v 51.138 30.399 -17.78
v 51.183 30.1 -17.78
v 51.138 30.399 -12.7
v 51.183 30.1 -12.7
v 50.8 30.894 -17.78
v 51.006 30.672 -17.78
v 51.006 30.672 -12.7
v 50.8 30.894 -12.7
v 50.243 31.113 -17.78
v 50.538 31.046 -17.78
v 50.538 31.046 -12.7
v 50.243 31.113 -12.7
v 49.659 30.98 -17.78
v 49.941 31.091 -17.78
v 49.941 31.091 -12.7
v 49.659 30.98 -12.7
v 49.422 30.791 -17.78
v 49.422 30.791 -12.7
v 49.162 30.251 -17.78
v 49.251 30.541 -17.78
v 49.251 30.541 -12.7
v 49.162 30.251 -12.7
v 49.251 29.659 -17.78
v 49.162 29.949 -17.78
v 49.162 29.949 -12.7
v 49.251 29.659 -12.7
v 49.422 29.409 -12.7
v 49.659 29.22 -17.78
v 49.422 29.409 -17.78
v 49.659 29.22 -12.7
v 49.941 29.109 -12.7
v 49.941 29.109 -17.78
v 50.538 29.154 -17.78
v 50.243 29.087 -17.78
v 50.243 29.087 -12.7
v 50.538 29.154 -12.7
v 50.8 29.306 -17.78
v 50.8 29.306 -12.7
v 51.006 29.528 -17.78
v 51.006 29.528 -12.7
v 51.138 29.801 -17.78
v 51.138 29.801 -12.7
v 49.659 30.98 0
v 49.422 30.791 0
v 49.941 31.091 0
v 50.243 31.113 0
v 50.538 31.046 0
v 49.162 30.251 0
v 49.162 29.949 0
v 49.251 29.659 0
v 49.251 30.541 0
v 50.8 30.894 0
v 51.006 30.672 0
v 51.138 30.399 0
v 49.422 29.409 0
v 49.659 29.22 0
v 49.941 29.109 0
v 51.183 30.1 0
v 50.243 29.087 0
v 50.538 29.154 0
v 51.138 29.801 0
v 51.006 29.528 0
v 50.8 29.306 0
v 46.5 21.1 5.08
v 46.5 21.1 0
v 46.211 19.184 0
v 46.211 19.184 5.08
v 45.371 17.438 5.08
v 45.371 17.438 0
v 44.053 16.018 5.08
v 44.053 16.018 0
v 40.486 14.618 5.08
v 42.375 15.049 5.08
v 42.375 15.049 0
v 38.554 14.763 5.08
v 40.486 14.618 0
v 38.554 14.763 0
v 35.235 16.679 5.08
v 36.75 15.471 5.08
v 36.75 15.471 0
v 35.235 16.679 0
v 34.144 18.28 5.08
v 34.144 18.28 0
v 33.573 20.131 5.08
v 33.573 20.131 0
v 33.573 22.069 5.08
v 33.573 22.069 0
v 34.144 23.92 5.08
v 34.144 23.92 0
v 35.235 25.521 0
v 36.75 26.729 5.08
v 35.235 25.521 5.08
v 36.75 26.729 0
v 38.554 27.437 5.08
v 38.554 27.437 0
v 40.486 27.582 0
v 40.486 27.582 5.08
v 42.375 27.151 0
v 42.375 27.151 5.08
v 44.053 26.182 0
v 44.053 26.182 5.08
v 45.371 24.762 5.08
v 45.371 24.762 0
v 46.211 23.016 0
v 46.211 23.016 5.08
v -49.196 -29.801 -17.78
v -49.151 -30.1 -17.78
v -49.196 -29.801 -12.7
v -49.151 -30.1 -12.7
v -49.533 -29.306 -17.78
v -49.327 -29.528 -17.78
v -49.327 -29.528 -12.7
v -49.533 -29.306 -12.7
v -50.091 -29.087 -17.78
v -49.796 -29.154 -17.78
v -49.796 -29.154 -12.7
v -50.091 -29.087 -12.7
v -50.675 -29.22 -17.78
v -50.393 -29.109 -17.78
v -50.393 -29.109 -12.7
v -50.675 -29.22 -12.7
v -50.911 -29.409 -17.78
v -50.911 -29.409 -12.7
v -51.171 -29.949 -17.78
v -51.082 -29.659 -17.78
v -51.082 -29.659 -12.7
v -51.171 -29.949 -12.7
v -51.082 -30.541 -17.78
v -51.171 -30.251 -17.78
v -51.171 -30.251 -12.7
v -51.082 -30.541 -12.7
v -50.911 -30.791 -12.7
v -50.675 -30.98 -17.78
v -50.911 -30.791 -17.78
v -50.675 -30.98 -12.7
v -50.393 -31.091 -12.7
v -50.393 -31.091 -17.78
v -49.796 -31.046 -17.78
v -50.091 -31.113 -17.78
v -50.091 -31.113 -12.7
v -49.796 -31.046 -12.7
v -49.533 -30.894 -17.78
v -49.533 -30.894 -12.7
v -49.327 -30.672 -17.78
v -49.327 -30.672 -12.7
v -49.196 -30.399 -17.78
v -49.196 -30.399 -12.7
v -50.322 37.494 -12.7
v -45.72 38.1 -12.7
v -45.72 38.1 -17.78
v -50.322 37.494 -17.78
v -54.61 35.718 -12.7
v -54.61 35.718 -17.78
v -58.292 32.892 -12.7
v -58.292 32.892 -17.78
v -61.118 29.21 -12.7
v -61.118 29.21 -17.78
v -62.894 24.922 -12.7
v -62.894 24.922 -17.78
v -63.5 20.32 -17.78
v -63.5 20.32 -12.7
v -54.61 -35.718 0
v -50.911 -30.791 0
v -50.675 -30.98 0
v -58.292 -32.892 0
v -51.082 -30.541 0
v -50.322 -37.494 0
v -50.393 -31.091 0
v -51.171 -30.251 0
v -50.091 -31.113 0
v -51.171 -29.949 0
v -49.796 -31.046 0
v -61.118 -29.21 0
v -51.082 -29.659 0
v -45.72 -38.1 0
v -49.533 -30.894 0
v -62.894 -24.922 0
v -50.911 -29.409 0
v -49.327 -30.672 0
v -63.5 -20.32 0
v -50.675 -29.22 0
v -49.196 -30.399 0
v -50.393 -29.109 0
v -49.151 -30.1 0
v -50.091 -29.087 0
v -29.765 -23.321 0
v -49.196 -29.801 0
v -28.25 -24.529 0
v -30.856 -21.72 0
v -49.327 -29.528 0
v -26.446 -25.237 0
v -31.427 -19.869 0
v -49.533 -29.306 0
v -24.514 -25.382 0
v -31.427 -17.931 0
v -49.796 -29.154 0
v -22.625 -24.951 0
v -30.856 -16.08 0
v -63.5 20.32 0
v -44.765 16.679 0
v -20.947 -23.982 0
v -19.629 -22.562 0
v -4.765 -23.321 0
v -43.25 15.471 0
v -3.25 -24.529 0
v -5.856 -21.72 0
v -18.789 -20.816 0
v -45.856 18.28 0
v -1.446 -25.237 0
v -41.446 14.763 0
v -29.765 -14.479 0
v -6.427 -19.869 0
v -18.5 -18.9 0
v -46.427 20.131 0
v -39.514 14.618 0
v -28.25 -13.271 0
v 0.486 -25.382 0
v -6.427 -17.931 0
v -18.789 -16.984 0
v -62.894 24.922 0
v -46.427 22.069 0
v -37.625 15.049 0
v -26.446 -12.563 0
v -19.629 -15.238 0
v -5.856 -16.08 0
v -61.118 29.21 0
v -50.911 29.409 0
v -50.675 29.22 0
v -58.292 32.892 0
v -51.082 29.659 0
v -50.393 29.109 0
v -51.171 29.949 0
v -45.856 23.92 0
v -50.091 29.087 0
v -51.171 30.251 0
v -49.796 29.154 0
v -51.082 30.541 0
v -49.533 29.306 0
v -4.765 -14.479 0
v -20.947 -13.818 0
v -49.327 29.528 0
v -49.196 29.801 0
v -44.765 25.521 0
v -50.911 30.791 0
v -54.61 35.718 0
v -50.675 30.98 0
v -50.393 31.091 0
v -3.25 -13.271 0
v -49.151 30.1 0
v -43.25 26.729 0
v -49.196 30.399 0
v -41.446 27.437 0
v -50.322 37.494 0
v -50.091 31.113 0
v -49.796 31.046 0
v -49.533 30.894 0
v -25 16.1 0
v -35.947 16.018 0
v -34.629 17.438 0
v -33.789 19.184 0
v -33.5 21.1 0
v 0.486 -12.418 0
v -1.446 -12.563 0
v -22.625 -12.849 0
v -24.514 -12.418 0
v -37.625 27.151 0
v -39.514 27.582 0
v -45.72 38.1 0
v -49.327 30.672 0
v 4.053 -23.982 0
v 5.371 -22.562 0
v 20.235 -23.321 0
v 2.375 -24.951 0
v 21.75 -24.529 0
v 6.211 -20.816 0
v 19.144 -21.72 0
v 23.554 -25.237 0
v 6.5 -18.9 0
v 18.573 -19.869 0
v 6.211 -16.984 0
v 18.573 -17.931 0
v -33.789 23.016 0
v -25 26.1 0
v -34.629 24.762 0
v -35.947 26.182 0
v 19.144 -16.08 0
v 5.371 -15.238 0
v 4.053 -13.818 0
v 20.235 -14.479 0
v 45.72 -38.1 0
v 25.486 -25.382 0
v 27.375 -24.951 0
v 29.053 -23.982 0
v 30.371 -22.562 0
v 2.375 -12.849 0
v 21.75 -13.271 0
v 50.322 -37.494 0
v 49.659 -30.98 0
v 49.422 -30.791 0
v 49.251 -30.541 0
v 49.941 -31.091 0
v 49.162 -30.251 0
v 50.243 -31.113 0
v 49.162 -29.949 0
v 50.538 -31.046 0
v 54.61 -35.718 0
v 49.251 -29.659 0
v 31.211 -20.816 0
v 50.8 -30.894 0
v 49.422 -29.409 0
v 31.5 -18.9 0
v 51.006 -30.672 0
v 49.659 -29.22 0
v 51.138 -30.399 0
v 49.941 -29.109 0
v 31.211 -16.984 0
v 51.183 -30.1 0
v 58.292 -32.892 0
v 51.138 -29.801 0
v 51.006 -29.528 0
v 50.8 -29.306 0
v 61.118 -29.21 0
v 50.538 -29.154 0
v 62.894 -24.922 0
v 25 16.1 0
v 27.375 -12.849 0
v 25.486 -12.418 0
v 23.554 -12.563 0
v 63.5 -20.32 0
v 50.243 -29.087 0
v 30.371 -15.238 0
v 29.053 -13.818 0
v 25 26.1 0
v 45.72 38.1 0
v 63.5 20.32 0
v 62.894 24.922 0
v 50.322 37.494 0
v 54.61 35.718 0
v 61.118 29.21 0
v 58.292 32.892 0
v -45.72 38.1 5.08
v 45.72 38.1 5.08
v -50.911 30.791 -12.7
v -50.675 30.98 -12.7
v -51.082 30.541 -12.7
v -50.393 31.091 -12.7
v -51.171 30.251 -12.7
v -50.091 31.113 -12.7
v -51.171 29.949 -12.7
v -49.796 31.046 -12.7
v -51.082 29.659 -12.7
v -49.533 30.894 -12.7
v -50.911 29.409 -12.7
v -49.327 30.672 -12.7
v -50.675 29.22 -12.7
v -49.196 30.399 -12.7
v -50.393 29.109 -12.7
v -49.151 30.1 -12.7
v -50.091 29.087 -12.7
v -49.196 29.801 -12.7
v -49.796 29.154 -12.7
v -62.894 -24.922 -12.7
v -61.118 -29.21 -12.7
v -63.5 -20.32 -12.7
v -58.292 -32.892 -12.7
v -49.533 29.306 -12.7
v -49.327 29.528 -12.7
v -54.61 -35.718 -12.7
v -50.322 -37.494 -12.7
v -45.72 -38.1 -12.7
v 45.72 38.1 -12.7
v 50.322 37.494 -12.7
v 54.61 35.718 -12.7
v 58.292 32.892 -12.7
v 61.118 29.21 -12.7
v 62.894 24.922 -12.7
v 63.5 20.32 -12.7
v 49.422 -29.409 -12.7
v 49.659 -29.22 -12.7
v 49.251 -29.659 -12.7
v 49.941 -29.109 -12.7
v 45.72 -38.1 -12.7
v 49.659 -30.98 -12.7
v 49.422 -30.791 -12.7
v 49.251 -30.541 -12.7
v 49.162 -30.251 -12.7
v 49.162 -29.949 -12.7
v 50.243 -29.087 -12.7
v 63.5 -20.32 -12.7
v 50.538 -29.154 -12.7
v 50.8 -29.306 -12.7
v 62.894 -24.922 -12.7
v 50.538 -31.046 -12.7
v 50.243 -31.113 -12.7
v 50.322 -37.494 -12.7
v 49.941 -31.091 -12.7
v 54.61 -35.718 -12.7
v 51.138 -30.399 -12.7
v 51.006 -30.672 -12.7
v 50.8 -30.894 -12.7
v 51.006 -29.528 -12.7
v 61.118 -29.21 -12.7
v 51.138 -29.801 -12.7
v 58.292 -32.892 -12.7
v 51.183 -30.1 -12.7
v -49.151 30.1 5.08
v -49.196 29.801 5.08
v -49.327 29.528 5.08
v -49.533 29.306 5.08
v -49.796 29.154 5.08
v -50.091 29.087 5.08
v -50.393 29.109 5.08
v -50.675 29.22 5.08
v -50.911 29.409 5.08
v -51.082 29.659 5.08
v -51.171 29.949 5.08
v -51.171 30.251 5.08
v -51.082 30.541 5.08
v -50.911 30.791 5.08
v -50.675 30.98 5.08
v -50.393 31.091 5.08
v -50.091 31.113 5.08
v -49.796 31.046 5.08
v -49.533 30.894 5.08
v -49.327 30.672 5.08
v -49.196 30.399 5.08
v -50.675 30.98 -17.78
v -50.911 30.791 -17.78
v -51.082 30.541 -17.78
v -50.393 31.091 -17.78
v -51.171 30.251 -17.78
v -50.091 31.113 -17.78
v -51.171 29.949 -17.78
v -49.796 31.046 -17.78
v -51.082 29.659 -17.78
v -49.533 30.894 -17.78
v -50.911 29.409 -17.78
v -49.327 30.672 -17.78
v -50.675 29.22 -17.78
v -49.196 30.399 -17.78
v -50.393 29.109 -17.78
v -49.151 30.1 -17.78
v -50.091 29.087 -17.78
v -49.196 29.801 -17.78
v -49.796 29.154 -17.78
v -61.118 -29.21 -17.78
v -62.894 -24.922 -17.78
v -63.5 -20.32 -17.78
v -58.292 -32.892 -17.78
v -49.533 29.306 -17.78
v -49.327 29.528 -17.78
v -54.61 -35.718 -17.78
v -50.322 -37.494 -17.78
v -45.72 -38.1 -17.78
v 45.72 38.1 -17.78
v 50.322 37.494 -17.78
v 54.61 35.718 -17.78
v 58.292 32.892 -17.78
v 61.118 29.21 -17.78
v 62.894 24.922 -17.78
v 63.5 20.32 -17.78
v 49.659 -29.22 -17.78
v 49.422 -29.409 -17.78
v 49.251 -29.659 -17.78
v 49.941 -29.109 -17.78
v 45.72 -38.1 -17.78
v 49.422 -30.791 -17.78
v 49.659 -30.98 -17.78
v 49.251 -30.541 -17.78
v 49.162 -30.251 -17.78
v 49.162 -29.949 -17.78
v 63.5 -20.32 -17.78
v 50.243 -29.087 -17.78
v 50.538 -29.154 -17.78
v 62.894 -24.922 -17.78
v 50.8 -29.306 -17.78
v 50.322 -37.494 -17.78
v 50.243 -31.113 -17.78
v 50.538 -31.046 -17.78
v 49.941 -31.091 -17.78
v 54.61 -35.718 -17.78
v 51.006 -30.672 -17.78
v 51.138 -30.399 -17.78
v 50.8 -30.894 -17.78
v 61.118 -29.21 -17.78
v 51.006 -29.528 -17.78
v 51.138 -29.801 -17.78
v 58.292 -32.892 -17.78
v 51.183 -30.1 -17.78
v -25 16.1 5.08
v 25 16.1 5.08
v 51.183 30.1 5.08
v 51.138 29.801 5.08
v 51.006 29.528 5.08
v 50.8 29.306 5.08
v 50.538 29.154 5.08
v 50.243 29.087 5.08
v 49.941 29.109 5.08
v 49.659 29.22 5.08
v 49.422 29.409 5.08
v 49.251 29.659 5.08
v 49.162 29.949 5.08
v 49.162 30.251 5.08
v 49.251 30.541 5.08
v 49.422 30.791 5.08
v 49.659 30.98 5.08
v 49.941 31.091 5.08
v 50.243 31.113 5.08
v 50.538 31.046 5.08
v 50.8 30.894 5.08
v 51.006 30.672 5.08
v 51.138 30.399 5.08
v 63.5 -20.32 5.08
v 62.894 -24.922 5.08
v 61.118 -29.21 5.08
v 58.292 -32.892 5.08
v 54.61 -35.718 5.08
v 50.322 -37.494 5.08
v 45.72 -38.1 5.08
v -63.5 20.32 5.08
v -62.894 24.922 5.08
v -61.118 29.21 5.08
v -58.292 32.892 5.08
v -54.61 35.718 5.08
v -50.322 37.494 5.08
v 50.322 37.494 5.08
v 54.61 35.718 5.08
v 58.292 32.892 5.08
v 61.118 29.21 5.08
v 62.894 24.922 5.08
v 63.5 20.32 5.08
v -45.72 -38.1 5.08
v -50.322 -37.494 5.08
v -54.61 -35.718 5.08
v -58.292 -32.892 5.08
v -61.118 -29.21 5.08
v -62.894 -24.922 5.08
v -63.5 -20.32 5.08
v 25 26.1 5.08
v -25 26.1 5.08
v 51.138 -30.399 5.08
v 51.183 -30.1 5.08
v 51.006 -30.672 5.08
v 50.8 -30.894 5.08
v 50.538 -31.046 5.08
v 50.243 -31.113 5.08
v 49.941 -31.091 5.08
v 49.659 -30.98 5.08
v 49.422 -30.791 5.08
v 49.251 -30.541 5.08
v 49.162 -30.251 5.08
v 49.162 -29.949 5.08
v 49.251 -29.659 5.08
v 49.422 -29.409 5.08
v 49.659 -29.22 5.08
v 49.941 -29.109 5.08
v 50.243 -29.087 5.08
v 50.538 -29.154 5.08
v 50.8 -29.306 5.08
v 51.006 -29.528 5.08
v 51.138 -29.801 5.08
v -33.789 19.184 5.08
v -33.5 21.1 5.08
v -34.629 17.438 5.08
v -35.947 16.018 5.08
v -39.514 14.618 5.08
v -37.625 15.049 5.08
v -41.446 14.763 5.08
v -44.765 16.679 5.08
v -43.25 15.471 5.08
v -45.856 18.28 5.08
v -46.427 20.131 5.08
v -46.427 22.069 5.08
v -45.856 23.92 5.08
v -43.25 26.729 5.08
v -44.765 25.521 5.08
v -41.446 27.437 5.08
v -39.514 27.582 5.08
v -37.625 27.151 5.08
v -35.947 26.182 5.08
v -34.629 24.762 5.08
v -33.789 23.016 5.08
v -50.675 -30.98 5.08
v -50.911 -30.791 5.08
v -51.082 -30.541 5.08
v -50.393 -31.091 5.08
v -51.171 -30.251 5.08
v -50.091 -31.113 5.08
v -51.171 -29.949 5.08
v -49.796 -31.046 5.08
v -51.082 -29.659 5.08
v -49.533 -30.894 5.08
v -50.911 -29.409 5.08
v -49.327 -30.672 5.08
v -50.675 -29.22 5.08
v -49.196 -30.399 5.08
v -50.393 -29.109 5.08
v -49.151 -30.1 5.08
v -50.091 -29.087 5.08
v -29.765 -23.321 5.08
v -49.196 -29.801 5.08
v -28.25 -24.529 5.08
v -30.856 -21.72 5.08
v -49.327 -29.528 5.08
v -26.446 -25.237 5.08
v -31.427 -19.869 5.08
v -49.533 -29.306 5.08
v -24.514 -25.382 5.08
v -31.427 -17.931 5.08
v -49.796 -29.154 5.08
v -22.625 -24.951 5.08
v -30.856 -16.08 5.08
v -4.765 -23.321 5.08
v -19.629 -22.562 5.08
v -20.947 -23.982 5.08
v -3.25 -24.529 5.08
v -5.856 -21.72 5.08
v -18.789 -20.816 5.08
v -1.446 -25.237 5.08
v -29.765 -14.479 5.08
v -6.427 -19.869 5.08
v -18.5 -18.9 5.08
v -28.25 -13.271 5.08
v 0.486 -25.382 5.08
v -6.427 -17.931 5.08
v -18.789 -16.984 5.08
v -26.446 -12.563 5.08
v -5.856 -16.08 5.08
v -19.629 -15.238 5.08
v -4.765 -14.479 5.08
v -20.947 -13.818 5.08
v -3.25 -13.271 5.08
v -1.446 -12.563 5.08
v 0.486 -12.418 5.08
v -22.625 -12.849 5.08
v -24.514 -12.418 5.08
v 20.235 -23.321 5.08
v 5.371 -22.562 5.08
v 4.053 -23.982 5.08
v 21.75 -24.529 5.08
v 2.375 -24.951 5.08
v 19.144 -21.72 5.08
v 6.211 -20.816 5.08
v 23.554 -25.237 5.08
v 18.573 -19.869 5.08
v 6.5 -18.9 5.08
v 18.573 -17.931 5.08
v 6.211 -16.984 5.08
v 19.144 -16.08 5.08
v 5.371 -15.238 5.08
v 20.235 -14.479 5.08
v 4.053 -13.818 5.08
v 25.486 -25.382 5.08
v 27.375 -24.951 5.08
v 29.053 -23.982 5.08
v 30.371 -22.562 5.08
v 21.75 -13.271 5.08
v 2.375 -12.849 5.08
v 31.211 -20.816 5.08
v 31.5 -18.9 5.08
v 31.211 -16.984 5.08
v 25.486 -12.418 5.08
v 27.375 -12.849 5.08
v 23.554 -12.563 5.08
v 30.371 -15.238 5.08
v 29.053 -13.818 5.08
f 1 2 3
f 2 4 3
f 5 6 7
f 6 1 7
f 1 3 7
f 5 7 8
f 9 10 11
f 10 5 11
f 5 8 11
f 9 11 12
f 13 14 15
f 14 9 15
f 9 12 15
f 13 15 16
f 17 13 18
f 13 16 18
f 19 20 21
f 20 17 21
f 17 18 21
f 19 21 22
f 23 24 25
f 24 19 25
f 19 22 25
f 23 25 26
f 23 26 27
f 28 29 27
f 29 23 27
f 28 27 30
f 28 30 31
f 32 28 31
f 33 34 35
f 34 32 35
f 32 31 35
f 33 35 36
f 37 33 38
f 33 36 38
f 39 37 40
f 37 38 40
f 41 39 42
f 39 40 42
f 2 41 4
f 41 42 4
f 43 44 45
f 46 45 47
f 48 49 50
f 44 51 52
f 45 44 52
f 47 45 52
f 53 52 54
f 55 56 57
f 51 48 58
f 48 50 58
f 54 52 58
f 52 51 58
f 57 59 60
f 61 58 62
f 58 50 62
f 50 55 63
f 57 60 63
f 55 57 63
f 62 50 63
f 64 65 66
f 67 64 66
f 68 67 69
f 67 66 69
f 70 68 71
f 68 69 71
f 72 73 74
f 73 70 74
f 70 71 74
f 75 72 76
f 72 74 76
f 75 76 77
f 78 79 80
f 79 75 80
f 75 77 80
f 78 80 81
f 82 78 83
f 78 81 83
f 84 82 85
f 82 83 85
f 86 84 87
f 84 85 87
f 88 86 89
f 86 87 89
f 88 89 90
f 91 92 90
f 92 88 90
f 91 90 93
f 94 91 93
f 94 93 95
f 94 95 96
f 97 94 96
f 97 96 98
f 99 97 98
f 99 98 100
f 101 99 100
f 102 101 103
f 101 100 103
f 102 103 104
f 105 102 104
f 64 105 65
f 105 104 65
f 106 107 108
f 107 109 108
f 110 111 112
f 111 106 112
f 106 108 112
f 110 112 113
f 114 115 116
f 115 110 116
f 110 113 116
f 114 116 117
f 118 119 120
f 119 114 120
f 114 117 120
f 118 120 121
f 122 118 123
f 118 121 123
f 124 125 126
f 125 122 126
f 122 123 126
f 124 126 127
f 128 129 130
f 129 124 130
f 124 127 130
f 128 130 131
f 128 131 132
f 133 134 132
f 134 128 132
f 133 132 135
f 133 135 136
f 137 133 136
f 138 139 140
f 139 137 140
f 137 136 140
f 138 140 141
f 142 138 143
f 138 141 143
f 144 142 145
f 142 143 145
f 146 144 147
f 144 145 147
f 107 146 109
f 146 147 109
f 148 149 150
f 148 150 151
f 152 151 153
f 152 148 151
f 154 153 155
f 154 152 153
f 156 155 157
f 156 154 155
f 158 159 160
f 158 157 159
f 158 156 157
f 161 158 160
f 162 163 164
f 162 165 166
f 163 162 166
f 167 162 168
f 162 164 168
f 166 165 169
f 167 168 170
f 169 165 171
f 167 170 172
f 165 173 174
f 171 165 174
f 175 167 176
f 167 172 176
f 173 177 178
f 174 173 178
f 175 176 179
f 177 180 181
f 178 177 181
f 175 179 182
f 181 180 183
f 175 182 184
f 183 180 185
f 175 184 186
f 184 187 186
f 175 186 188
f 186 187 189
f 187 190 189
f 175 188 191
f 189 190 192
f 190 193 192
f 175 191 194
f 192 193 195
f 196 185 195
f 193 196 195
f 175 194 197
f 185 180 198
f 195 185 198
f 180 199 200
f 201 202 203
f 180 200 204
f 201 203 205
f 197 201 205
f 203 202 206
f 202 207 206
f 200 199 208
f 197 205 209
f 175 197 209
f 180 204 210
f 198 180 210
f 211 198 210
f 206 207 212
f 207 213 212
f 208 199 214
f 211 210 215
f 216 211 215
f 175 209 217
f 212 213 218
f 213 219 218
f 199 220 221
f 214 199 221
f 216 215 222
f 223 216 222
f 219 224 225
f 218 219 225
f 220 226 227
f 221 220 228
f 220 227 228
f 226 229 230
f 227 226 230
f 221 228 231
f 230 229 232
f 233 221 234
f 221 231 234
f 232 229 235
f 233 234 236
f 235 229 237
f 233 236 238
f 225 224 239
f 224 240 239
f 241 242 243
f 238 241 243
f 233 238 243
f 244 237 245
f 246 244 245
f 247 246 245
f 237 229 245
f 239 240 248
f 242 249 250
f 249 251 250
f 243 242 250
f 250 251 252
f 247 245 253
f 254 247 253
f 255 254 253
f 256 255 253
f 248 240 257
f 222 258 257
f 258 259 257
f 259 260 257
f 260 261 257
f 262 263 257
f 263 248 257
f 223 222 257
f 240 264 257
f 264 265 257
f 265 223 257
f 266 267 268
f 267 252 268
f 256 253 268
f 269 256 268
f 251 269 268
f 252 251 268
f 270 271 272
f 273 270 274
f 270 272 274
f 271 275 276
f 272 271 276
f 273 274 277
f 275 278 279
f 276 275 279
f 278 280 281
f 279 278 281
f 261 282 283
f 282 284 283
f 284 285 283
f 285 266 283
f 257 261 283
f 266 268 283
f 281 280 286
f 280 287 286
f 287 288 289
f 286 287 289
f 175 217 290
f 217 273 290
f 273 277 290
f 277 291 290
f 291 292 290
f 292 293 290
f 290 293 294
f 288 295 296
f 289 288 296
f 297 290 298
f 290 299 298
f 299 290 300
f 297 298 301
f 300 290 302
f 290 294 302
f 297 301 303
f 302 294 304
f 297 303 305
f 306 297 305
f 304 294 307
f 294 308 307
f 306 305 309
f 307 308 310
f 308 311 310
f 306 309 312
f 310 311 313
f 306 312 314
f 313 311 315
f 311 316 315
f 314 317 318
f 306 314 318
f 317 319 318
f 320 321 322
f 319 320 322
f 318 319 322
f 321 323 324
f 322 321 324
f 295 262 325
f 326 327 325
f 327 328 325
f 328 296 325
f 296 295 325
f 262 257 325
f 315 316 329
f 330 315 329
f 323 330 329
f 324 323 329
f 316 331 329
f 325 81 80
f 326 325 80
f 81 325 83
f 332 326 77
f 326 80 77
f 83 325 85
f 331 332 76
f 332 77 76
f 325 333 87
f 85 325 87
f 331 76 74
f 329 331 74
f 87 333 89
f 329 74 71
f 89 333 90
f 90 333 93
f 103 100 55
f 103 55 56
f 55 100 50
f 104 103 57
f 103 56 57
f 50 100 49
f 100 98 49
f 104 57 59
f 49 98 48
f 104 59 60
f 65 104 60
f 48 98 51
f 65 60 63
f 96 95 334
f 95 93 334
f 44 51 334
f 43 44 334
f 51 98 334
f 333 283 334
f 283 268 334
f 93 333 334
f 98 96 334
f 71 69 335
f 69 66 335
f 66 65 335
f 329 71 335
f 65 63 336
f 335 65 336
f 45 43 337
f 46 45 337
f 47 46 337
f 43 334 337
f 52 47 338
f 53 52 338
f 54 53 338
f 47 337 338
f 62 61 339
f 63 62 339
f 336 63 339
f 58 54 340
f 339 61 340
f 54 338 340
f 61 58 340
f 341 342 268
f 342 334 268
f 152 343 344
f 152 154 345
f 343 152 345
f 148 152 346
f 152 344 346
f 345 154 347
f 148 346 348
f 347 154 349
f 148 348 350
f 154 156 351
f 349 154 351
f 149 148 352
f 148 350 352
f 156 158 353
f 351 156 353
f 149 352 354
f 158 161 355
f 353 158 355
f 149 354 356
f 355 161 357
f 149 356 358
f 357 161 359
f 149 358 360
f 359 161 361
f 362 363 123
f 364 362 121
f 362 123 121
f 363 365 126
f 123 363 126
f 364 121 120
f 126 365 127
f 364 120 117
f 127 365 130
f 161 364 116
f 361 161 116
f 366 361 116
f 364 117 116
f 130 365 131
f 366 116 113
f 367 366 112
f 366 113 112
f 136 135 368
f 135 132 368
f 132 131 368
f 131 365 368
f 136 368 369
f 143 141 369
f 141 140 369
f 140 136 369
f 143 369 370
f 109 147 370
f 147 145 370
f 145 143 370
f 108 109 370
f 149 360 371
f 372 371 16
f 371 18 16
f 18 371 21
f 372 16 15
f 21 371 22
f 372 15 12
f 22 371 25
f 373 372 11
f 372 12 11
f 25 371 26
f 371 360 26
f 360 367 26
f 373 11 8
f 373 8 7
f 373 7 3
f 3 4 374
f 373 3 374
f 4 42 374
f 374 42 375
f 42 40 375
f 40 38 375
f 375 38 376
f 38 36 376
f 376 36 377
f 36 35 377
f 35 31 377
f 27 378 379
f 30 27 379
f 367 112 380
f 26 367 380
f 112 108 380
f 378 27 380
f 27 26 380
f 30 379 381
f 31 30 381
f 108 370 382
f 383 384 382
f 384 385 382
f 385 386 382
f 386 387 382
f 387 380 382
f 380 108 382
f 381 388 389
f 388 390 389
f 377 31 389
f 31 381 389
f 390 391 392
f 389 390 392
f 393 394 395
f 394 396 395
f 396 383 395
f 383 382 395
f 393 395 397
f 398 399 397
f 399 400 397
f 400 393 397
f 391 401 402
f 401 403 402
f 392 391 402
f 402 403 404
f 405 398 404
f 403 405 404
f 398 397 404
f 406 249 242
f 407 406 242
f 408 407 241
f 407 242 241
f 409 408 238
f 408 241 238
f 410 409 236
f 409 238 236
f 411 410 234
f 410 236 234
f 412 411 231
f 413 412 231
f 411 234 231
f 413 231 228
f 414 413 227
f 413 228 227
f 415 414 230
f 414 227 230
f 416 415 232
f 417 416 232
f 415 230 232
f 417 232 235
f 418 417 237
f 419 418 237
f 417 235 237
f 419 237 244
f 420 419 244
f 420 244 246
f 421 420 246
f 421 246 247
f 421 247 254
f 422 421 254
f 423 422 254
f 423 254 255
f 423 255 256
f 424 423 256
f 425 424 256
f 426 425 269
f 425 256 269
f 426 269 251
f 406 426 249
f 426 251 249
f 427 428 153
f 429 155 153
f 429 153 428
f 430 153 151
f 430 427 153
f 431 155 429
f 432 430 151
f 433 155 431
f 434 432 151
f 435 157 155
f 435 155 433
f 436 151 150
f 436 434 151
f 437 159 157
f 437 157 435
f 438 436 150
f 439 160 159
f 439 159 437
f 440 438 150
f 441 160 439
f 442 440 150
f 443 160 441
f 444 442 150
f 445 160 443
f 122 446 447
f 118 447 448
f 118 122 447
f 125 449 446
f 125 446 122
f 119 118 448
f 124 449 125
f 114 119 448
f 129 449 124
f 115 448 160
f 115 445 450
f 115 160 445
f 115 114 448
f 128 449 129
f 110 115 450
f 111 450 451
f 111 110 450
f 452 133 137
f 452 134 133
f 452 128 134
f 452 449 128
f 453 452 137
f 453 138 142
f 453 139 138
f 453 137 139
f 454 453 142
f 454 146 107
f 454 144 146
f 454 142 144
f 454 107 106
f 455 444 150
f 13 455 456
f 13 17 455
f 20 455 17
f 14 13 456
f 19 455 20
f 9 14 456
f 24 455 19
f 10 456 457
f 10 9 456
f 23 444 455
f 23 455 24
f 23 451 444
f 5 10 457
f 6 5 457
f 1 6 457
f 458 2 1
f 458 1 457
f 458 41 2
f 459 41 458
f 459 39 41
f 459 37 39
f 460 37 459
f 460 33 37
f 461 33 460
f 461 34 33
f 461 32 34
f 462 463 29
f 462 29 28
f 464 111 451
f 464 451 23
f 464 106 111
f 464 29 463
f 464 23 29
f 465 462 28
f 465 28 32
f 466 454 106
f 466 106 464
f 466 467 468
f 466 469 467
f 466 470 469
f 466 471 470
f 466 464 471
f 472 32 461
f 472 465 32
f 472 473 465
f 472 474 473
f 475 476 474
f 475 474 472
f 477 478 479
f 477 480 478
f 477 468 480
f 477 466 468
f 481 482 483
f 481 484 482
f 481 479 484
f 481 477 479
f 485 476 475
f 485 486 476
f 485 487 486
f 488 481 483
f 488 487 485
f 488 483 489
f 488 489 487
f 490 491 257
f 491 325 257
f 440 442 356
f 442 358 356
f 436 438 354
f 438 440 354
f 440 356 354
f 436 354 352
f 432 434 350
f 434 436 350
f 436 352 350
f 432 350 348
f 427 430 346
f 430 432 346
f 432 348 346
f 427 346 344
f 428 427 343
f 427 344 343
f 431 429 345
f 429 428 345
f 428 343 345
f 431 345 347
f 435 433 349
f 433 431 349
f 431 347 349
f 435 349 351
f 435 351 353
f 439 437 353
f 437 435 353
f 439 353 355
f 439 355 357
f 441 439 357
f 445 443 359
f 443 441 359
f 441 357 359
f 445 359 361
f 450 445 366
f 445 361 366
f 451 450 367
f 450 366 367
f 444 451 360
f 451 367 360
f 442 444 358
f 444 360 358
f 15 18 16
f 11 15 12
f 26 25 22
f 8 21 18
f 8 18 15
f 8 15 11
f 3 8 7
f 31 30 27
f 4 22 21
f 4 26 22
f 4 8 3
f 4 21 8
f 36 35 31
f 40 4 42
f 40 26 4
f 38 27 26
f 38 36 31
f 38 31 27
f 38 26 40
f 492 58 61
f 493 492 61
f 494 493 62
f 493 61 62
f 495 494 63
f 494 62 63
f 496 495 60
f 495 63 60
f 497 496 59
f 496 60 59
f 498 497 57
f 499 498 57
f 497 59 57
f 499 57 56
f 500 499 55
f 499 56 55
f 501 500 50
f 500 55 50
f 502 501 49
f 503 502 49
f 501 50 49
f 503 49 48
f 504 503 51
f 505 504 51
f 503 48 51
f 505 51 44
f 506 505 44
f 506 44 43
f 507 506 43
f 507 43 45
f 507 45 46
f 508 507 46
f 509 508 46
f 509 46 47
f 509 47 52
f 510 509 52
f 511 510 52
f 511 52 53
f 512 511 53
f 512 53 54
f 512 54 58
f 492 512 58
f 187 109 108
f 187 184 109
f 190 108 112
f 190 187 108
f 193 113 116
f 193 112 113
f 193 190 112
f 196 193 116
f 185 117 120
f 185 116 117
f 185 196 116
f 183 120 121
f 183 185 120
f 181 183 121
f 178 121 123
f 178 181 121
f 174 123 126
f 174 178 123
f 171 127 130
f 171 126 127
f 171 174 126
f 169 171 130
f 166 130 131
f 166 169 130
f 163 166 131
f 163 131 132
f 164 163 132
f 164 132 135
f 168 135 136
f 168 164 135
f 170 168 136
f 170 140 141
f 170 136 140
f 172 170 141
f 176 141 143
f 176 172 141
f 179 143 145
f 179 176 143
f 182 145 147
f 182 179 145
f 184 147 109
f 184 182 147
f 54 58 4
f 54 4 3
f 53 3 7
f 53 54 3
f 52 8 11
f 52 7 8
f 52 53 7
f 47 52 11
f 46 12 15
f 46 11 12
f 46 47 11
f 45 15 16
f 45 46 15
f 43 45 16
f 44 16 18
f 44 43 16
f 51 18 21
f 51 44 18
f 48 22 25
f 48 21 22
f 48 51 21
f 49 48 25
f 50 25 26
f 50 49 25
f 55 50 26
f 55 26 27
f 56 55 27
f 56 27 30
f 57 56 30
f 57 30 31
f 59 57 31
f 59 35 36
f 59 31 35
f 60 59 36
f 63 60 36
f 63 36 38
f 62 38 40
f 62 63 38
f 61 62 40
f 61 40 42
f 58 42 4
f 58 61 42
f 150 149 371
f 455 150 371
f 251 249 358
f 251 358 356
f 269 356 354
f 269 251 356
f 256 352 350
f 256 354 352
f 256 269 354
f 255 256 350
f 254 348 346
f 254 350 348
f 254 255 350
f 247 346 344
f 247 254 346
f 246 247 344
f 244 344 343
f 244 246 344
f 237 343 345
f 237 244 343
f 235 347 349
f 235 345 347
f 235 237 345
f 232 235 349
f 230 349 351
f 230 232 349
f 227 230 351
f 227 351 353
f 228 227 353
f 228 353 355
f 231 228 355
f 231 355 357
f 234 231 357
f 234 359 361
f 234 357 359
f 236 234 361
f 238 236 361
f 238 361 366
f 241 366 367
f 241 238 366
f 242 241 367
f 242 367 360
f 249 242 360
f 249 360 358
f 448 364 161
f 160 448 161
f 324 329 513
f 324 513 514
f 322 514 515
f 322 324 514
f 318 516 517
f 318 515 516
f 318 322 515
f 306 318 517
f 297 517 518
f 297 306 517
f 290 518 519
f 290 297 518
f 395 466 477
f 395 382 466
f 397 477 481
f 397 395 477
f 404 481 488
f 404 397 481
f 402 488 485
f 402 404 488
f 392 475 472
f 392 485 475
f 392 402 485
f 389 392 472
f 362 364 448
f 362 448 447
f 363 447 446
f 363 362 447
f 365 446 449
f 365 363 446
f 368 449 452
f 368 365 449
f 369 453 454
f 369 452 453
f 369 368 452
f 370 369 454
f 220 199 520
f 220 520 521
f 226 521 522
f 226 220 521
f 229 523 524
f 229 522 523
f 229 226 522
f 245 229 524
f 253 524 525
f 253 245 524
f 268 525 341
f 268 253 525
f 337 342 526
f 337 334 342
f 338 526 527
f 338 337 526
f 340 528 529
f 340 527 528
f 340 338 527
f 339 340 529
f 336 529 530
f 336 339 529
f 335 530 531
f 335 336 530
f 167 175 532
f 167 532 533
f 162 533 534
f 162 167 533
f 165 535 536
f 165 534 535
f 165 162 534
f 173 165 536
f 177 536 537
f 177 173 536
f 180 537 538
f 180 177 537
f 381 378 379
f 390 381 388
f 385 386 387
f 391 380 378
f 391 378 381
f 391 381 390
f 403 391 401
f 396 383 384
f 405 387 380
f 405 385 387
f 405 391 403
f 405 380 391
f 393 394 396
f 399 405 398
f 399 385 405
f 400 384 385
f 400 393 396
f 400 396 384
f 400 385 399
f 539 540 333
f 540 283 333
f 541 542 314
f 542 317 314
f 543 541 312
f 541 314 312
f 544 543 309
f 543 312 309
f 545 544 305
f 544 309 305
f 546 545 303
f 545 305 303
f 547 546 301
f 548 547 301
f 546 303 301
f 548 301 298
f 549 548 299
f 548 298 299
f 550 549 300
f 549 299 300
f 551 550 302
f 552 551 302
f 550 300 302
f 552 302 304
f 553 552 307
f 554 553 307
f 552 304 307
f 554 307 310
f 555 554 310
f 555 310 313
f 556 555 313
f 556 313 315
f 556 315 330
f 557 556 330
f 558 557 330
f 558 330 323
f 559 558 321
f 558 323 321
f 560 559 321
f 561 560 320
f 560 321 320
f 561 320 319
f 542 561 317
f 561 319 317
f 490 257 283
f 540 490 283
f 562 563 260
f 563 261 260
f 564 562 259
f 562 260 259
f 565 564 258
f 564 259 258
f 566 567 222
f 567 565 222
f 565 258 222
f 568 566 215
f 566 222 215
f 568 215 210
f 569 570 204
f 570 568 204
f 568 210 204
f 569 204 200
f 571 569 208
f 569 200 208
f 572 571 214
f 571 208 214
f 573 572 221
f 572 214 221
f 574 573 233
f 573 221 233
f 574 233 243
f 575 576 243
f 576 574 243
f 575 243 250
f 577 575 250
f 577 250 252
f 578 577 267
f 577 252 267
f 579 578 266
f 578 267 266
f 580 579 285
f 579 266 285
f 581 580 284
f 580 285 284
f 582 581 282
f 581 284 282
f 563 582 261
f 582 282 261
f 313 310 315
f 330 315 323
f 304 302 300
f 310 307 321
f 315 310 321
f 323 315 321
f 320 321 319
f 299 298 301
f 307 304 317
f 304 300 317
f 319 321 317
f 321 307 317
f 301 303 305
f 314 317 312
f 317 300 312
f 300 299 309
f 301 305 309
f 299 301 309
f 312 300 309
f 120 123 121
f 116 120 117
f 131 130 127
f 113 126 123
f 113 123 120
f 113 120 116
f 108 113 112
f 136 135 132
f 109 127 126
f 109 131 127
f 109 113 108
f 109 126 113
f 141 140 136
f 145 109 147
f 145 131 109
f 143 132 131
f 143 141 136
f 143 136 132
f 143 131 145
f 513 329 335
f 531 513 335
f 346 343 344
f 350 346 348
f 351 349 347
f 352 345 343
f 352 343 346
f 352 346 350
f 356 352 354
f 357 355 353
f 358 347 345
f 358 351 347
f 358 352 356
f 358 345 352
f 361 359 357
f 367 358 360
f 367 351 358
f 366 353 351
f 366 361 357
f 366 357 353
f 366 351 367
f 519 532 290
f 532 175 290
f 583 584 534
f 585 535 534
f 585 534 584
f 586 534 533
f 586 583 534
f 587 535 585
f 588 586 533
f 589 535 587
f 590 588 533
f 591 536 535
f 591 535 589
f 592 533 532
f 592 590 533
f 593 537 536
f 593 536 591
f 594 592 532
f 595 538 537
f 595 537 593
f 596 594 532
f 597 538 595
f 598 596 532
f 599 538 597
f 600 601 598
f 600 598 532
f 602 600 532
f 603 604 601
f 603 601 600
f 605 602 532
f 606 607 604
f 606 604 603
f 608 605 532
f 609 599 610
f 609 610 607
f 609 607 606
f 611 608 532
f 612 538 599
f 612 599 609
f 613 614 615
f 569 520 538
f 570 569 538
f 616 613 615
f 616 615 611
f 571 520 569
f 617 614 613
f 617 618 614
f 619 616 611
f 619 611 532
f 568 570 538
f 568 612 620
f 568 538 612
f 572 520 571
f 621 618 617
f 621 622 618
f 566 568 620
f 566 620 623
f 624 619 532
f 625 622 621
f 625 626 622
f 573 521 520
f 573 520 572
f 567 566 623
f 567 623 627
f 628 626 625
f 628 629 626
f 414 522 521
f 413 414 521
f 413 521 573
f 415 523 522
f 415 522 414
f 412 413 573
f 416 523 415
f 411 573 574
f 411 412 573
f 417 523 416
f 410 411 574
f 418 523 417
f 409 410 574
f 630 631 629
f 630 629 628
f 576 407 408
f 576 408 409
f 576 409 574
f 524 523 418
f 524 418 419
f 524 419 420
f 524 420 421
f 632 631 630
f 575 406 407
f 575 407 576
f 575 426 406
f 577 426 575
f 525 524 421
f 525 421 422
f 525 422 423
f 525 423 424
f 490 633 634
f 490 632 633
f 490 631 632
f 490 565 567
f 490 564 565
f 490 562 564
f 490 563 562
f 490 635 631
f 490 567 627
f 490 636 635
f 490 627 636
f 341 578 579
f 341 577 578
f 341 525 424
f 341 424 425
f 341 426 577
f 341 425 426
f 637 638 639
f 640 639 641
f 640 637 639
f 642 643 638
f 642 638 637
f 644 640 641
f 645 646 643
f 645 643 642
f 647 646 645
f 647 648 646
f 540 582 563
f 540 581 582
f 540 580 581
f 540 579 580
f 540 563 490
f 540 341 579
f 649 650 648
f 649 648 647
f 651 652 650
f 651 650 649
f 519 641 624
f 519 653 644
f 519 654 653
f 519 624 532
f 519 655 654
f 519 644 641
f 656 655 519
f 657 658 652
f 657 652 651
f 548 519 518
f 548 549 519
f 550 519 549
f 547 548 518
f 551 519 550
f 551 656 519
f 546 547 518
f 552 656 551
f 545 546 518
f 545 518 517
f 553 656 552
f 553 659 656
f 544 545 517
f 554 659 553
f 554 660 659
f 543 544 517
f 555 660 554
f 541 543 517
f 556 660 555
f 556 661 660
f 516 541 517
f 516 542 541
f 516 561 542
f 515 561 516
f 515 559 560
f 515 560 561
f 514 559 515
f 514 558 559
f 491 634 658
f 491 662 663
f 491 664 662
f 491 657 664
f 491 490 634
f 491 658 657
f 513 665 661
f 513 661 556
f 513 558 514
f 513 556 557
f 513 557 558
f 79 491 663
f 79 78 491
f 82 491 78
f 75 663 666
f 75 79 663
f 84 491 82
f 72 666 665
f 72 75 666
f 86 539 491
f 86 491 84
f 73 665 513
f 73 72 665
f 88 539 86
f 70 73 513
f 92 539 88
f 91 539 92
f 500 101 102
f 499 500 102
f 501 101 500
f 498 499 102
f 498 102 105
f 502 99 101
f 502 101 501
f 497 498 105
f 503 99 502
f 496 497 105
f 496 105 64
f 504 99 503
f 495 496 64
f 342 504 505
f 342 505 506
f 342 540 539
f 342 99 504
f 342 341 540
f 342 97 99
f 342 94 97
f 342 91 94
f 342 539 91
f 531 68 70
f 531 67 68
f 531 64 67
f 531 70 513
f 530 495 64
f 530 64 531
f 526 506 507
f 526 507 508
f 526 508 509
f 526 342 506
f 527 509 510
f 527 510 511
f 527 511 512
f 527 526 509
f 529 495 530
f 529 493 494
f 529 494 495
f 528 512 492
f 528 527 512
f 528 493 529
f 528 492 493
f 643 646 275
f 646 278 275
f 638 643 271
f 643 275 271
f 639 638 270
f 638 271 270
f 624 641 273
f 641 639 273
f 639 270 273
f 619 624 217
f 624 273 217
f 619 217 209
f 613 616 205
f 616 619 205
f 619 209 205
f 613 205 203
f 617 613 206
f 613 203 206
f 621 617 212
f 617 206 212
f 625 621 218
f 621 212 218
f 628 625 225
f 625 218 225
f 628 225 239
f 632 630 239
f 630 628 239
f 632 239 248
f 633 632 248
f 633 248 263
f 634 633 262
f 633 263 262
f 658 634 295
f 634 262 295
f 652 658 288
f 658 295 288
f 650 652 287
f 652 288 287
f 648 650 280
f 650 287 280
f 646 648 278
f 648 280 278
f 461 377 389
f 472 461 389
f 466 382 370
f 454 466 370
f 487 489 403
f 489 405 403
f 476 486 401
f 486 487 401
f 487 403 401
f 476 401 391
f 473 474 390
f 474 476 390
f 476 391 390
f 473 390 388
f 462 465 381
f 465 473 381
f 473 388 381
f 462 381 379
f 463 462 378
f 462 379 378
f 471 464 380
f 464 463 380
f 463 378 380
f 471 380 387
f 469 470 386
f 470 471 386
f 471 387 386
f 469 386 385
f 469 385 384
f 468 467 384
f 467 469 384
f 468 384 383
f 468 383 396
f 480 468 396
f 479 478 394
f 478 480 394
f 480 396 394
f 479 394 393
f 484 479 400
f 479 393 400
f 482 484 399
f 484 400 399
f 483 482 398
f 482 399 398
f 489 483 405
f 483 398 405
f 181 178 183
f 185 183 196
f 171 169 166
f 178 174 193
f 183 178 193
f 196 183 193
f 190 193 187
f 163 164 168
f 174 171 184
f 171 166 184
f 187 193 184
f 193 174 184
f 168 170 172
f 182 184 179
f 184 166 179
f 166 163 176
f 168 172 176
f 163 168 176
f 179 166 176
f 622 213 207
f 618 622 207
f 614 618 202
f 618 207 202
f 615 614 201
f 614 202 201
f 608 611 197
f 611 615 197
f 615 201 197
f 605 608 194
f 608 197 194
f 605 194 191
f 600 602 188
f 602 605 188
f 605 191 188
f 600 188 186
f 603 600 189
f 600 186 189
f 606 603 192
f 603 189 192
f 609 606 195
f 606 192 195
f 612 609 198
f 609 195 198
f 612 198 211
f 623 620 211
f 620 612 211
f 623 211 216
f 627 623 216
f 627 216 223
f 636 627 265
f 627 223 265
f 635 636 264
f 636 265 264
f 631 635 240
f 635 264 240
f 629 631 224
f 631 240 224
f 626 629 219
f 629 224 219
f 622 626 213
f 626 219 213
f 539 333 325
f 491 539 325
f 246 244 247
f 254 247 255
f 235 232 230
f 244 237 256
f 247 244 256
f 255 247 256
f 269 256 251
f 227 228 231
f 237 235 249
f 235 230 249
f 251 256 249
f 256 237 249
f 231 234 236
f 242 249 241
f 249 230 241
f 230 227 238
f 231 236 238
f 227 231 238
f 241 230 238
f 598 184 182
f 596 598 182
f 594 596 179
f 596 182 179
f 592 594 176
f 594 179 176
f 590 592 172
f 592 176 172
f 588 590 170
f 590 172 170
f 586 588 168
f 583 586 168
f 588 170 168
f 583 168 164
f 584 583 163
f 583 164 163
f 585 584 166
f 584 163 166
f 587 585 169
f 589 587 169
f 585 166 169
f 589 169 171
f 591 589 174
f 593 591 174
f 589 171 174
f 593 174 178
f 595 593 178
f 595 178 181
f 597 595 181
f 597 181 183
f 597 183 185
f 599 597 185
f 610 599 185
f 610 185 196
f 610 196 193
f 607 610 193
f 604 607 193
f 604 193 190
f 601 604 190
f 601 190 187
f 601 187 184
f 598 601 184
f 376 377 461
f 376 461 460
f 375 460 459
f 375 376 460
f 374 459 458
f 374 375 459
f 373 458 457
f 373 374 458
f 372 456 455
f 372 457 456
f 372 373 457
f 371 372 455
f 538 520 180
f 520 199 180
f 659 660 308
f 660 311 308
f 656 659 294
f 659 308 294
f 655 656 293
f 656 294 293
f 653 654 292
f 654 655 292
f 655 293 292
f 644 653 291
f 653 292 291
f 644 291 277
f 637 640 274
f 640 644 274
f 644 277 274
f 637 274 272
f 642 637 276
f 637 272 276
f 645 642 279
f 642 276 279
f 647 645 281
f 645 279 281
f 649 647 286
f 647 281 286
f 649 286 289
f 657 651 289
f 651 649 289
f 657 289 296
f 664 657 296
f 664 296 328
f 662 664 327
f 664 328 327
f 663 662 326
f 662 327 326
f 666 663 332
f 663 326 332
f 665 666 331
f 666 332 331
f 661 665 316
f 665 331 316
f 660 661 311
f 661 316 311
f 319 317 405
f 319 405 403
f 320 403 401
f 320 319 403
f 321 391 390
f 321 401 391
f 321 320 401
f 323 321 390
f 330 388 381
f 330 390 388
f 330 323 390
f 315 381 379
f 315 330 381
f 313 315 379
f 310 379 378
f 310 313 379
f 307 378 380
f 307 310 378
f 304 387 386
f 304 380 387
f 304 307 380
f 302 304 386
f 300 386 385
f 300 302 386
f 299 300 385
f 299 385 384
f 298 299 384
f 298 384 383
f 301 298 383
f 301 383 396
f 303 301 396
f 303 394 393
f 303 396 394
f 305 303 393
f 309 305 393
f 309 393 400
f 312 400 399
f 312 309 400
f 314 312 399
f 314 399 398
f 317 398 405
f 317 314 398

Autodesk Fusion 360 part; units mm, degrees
sketch "TopSketch" plane through (0, 0, 0) normal (0, 0, 1) x (1, 0, 0)
  line L0 (45.72, 38.1) -> (-45.72, 38.1)
  line L1 (-63.5, 20.32) -> (-63.5, -20.32)
  line L2 (-45.72, -38.1) -> (45.72, -38.1)
  line L3 (63.5, -20.32) -> (63.5, 20.32)
  line L4 (63.5, 38.1) -> (-63.5, -38.1) construction
  line L5 (-63.5, 38.1) -> (63.5, -38.1) construction
  arc A0 (-45.72, 38.1) -> (-63.5, 20.32) centre (-45.72, 20.32) ccw
  arc A1 (-63.5, -20.32) -> (-45.72, -38.1) centre (-45.72, -20.32) ccw
  arc A2 (45.72, -38.1) -> (63.5, -20.32) centre (45.72, -20.32) ccw
  arc A3 (63.5, 20.32) -> (45.72, 38.1) centre (45.72, 20.32) ccw
  line L6 (-25, 26.1) -> (25, 26.1)
  line L7 (25, 26.1) -> (25, 16.1)
  line L8 (25, 16.1) -> (-25, 16.1)
  line L9 (-25, 16.1) -> (-25, 26.1)
  circle A4 centre (40, 21.1) radius 6.5
  circle A5 centre (25, -18.9) radius 6.5
  circle A6 centre (0, -18.9) radius 6.5
  line L10 (0, 38.1) -> (0, -38.1) construction
  circle A7 centre (-40, 21.1) radius 6.5
  circle A8 centre (-25, -18.9) radius 6.5
  line L11 (61.2418, 9.5468) -> (17.2418, 9.5468)
  line L12 (17.2418, 9.5468) -> (17.2418, -9.4532)
  line L13 (17.2418, -9.4532) -> (61.2418, -9.4532)
  line L14 (61.2418, -9.4532) -> (61.2418, 9.5468)
  line L15 (61.2418, 9.5468) -> (17.2418, -9.4532) construction
  line L16 (17.2418, 9.5468) -> (61.2418, -9.4532) construction
  point P0 (0, 26.1)
  point P1 (-25, 21.1)
  point P2 (25, 21.1)
  point P3 (39.2418, 0.0468)
  dimension "d1" = 127
  dimension "d2" = 76.2
  dimension "d3" = 17.78
  dimension "d4" = 17.78
  dimension "d5" = 17.78
  dimension "d6" = 17.78
  dimension "d10" = 50
  dimension "d11" = 10
  dimension "d12" = 13
  dimension "d13" = 12
  dimension "d14" = 15
  dimension "d15" = 13
  dimension "d16" = 35
  dimension "d17" = 13
  dimension "d28" = 44
  dimension "d29" = 19
extrude "Extrude1" add sketch "TopSketch" along normal blind 5.08 contours L0 L1 L2 L3 A0 A1 A2 A3 | L11 L12 L13 L14 makes body 1
sketch "StandSketch" plane through (0, 0, 0) normal (0, 0, -1) x (1, 0, 0)
  circle A0 centre (-25, 18.9) radius 6.5
  circle A1 centre (25, 18.9) radius 6.5
  circle A2 centre (0, 18.9) radius 6.5
  circle A3 centre (-40, -21.1) radius 6.5
  circle A4 centre (40, -21.1) radius 6.5
  line L0 (-25, -16.1) -> (25, -16.1)
  line L1 (25, -16.1) -> (25, -26.1)
  line L2 (25, -26.1) -> (-25, -26.1)
  line L3 (-25, -26.1) -> (-25, -16.1)
  arc A5 (45.72, -38.1) -> (63.5, -20.32) centre (45.72, -20.32) ccw
  line L4 (63.5, -20.32) -> (63.5, 20.32)
  arc A6 (63.5, 20.32) -> (45.72, 38.1) centre (45.72, 20.32) ccw
  line L5 (45.72, 38.1) -> (-45.72, 38.1)
  arc A7 (-45.72, 38.1) -> (-63.5, 20.32) centre (-45.72, 20.32) ccw
  line L6 (-63.5, 20.32) -> (-63.5, -20.32)
  arc A8 (-63.5, -20.32) -> (-45.72, -38.1) centre (-45.72, -20.32) ccw
  line L7 (-45.72, -38.1) -> (45.72, -38.1)
  line L8 (63.5, 38.1) -> (-63.5, 38.1) construction
  line L9 (-63.5, 38.1) -> (-63.5, -38.1) construction
  line L10 (-63.5, -38.1) -> (63.5, -38.1) construction
  line L11 (63.5, -38.1) -> (63.5, 38.1) construction
  line L12 (63.5, 38.1) -> (-63.5, -38.1) construction
  line L13 (-63.5, 38.1) -> (63.5, -38.1) construction
  circle A9 centre (-50.1667, 30.1) radius 1.016
  line L14 (0, 38.1) -> (0, -38.1) construction
  line L15 (-63.5, 0) -> (63.5, 0) construction
  circle A10 centre (50.1667, 30.1) radius 1.016
  circle A11 centre (-50.1667, -30.1) radius 1.016
  circle A12 centre (50.1667, -30.1) radius 1.016
  dimension "d18" = 127
  dimension "d19" = 76.2
  dimension "d20" = 2.032
  dimension "d21" = 8
extrude "Extrude3" add sketch "StandSketch" along normal blind 12.7 separate body contours A9 | A10 | A11 | A12 makes body 2 at (50.1413, -31.1157, -8.4667) makes body 3 at (50.1413, 29.0843, -8.4667) makes body 4 at (-50.192, -31.1157, -8.4667) makes body 5 at (-50.192, 29.0843, -8.4667)
extrude "Extrude2" cut sketch "StandSketch" against normal up to surface (5.08 mm away) contours A9 | A10 | A11 | A12 bodies 1
sketch "BotSketch" plane through (0, 0, -12.7) normal (0, 0, -1) x (1, 0, 0)
  circle A0 centre (50.1667, 30.1) radius 1.016
  circle A1 centre (-50.1667, -30.1) radius 1.016
  circle A2 centre (50.1667, -30.1) radius 1.016
  circle A3 centre (-50.1667, 30.1) radius 1.016
  circle A4 centre (50.1667, 30.1) radius 1.016
  circle A5 centre (-25, 18.9) radius 6.5
  circle A6 centre (25, 18.9) radius 6.5
  circle A7 centre (0, 18.9) radius 6.5
  circle A8 centre (-40, -21.1) radius 6.5
  circle A9 centre (40, -21.1) radius 6.5
  line L0 (-25, -16.1) -> (25, -16.1)
  line L1 (25, -16.1) -> (25, -26.1)
  line L2 (25, -26.1) -> (-25, -26.1)
  line L3 (-25, -26.1) -> (-25, -16.1)
  arc A10 (45.72, -38.1) -> (63.5, -20.32) centre (45.72, -20.32) ccw
  line L4 (63.5, -20.32) -> (63.5, 20.32)
  arc A11 (63.5, 20.32) -> (45.72, 38.1) centre (45.72, 20.32) ccw
  line L5 (45.72, 38.1) -> (-45.72, 38.1)
  arc A12 (-45.72, 38.1) -> (-63.5, 20.32) centre (-45.72, 20.32) ccw
  line L6 (-63.5, 20.32) -> (-63.5, -20.32)
  arc A13 (-63.5, -20.32) -> (-45.72, -38.1) centre (-45.72, -20.32) ccw
  line L7 (-45.72, -38.1) -> (45.72, -38.1)
extrude "Extrude4" add sketch "BotSketch" along normal blind 5.08 separate body contours A5 | A6 | A7 | A8 | A9 | L0 L1 L2 L3 | A10 L4 A11 L5 A12 L6 A13 L7 makes body 6
sketch "Sketch4" plane through (0, 0, 5.08) normal (0, 0, 1) x (-1, 0, 0)
  circle A0 centre (50.1667, -30.1) radius 1.016
  circle A1 centre (-50.1667, -30.1) radius 1.016
  circle A2 centre (50.1667, 30.1) radius 1.016
  circle A3 centre (-50.1667, 30.1) radius 1.016
  circle A4 centre (25, 18.9) radius 6.5
  circle A5 centre (40, -21.1) radius 6.5
  circle A6 centre (0, 18.9) radius 6.5
  circle A7 centre (-25, 18.9) radius 6.5
  circle A8 centre (-40, -21.1) radius 6.5
  line L0 (-25, -16.1) -> (25, -16.1)
  line L1 (25, -16.1) -> (25, -26.1)
  line L2 (25, -26.1) -> (-25, -26.1)
  line L3 (-25, -26.1) -> (-25, -16.1)
  arc A9 (-63.5, -20.32) -> (-45.72, -38.1) centre (-45.72, -20.32) ccw
  line L4 (-45.72, -38.1) -> (45.72, -38.1)
  arc A10 (45.72, -38.1) -> (63.5, -20.32) centre (45.72, -20.32) ccw
  line L5 (63.5, -20.32) -> (63.5, 20.32)
  arc A11 (63.5, 20.32) -> (45.72, 38.1) centre (45.72, 20.32) ccw
  line L6 (45.72, 38.1) -> (-45.72, 38.1)
  arc A12 (-45.72, 38.1) -> (-63.5, 20.32) centre (-45.72, 20.32) ccw
  line L7 (-63.5, 20.32) -> (-63.5, -20.32)
sketch "Sketch5" plane through (0, 0, -17.78) normal (0, 0, -1) x (1, 0, 0)
  circle A0 centre (50.1667, -30.1) radius 1.016
  circle A1 centre (50.1667, 30.1) radius 1.016
  circle A2 centre (-50.1667, 30.1) radius 1.016
  circle A3 centre (-50.1667, -30.1) radius 1.016
  line L0 (-45.72, -38.1) -> (45.72, -38.1)
  arc A4 (45.72, -38.1) -> (63.5, -20.32) centre (45.72, -20.32) ccw
  line L1 (63.5, -20.32) -> (63.5, 20.32)
  arc A5 (63.5, 20.32) -> (45.72, 38.1) centre (45.72, 20.32) ccw
  line L2 (45.72, 38.1) -> (-45.72, 38.1)
  arc A6 (-45.72, 38.1) -> (-63.5, 20.32) centre (-45.72, 20.32) ccw
  line L3 (-63.5, 20.32) -> (-63.5, -20.32)
  arc A7 (-63.5, -20.32) -> (-45.72, -38.1) centre (-45.72, -20.32) ccw
equation "matThickness = 0.2 in"
equation "d8 = matThickness"
equation "d26 = matThickness"
